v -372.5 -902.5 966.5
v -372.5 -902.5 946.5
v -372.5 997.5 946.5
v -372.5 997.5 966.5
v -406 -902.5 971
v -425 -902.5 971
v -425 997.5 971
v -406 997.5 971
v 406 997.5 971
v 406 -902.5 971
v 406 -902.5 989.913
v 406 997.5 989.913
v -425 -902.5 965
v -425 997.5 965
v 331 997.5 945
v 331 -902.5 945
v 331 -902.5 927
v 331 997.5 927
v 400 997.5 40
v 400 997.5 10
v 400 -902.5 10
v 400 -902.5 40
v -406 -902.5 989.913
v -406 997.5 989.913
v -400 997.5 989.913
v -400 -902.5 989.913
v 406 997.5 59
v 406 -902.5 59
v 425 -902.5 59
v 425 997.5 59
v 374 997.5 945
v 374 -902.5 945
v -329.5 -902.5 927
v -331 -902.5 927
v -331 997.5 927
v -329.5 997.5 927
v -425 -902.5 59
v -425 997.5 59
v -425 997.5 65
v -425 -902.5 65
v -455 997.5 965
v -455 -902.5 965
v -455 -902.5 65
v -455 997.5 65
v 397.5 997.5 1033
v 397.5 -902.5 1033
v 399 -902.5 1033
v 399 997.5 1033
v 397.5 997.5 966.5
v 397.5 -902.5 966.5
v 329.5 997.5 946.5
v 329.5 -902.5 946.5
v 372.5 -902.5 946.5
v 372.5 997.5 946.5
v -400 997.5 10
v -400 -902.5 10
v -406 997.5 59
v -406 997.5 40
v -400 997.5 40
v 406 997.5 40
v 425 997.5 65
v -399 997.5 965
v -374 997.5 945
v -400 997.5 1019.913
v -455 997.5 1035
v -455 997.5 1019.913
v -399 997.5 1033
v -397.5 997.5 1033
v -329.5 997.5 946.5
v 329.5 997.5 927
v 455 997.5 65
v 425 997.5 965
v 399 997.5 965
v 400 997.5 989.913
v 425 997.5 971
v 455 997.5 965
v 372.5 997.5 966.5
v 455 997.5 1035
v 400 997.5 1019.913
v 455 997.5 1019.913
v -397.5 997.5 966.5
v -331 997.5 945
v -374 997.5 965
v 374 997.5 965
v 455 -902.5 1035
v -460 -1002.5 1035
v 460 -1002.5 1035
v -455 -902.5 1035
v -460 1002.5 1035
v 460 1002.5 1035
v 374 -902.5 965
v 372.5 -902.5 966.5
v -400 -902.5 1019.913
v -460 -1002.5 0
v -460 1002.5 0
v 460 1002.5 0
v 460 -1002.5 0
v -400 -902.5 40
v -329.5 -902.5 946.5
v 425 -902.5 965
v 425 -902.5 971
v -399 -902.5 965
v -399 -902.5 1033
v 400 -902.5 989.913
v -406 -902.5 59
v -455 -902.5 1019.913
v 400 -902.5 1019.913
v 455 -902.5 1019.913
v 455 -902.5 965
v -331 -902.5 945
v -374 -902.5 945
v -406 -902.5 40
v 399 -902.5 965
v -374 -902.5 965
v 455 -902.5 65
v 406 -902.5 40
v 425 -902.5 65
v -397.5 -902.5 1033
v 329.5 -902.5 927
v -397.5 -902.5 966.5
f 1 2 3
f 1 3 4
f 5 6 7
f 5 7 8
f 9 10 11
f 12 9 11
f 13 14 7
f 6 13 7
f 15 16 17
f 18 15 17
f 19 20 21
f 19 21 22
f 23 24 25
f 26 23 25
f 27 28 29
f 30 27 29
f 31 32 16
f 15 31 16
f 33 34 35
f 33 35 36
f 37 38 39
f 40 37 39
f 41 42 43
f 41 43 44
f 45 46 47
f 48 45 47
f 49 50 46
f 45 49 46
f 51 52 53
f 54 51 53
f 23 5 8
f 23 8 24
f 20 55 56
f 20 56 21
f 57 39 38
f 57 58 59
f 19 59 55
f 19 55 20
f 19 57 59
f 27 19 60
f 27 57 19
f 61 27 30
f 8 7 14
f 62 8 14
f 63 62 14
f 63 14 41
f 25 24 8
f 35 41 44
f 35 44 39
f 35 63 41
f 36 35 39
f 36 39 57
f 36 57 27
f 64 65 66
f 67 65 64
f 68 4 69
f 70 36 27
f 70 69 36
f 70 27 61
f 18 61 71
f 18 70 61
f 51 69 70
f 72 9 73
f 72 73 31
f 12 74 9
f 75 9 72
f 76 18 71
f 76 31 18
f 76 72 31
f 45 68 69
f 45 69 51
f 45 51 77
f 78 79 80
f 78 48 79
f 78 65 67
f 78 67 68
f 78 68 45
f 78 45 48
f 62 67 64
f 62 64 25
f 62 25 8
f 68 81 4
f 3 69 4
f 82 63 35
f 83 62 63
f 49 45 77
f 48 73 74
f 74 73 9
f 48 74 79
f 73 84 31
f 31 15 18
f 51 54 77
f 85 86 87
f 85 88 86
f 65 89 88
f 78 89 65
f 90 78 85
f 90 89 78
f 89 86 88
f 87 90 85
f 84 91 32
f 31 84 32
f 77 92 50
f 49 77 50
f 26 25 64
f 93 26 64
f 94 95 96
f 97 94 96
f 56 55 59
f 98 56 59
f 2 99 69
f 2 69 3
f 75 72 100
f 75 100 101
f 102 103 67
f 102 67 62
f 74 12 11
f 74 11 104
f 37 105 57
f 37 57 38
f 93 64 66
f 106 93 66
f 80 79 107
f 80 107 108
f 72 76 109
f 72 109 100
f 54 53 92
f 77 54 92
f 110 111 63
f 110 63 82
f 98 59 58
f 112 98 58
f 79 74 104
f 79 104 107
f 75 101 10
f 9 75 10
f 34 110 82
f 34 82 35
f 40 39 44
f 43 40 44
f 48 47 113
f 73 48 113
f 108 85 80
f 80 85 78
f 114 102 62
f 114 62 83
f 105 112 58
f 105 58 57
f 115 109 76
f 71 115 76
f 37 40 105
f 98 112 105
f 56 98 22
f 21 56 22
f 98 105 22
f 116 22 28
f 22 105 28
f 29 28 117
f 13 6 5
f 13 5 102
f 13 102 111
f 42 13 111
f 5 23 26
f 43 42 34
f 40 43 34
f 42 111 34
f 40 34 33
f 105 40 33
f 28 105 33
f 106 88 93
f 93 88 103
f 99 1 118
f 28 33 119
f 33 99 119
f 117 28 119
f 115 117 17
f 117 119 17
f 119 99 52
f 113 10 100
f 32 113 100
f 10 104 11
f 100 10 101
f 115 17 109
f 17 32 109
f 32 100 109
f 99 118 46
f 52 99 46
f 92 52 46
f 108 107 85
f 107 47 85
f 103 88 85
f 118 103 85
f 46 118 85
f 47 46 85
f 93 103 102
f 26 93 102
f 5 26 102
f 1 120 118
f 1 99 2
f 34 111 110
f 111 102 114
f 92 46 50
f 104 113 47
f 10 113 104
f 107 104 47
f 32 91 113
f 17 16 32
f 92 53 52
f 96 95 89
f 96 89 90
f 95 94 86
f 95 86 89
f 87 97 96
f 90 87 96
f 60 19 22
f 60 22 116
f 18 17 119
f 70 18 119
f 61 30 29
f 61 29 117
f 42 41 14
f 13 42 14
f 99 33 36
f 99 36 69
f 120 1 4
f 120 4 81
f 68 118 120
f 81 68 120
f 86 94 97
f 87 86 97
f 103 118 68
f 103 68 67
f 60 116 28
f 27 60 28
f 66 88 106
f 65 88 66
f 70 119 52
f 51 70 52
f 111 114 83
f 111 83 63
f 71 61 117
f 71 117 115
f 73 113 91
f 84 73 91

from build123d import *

# Parameters (mm, degrees)
CROQUIS1_W              = 920
CROQUIS1_H              = 2005
SALIENTE_EXTRUIR1_DEPTH = 1035
CROQUIS2_W              = 910
CROQUIS2_H              = 1900
CORTAR_EXTRUIR1_DEPTH   = 1025
SALIENTE_EXTRUIR2_DEPTH = 1900
SALIENTE_EXTRUIR3_DEPTH = 1900
SALIENTE_EXTRUIR4_DEPTH = 1900


with BuildPart() as part:
    # Croquis1 → Saliente-Extruir1 (new body)
    with BuildSketch(Plane.XY):
        Rectangle(CROQUIS1_W, CROQUIS1_H)
    extrude(amount=SALIENTE_EXTRUIR1_DEPTH)

    # Croquis2 → Cortar-Extruir1 (cut)
    with BuildSketch(Plane.XY.offset(1035)):
        with Locations((0, 47.5)):
            Rectangle(CROQUIS2_W, CROQUIS2_H)
    extrude(amount=-CORTAR_EXTRUIR1_DEPTH, mode=Mode.SUBTRACT)

    # Croquis3 → Saliente-Extruir2 (add)
    with BuildSketch(Plane(origin=(0, -902.5, 0), x_dir=(1, 0, 0), z_dir=(0, 1, 0))):
        Polygon((-406, -59), (-425, -59), (-425, -65), (-455, -65), (-455, -10), (-400, -10), (-400, -40), (-406, -40), align=None)
        Polygon((400, -10), (400, -40), (406, -40), (406, -59), (425, -59), (425, -65), (455, -65), (455, -10), align=None)
    extrude(amount=SALIENTE_EXTRUIR2_DEPTH)

    # Croquis4 → Saliente-Extruir3 (add)
    with BuildSketch(Plane(origin=(0, -902.5, 0), x_dir=(1, 0, 0), z_dir=(0, 1, 0))):
        Polygon((-455, -965), (-425, -965), (-425, -971), (-406, -971), (-406, -989.913190258), (-400, -989.913190258), (-400, -1019.913190258), (-455, -1019.913190258), align=None)
        Polygon((406, -971), (406, -989.913190258), (400, -989.913190258), (400, -1019.913190258), (455, -1019.913190258), (455, -965), (425, -965), (425, -971), align=None)
    extrude(amount=SALIENTE_EXTRUIR3_DEPTH)

    # Croquis5 → Saliente-Extruir4 (add)
    with BuildSketch(Plane(origin=(0, -902.5, 0), x_dir=(1, 0, 0), z_dir=(0, 1, 0))):
        Polygon((-399, -1033), (-399, -965), (-374, -965), (-374, -945), (-331, -945), (-331, -927), (-329.5, -927), (-329.5, -946.5), (-372.5, -946.5), (-372.5, -966.5), (-397.5, -966.5), (-397.5, -981.854825443), (-397.5, -1033), align=None)
        Polygon((397.5, -1033), (399, -1033), (399, -965), (374, -965), (374, -945), (331, -945), (331, -927), (329.5, -927), (329.5, -946.5), (372.5, -946.5), (372.5, -966.5), (397.5, -966.5), (397.5, -981.854825443), align=None)
    extrude(amount=SALIENTE_EXTRUIR4_DEPTH)


solid = part.part
